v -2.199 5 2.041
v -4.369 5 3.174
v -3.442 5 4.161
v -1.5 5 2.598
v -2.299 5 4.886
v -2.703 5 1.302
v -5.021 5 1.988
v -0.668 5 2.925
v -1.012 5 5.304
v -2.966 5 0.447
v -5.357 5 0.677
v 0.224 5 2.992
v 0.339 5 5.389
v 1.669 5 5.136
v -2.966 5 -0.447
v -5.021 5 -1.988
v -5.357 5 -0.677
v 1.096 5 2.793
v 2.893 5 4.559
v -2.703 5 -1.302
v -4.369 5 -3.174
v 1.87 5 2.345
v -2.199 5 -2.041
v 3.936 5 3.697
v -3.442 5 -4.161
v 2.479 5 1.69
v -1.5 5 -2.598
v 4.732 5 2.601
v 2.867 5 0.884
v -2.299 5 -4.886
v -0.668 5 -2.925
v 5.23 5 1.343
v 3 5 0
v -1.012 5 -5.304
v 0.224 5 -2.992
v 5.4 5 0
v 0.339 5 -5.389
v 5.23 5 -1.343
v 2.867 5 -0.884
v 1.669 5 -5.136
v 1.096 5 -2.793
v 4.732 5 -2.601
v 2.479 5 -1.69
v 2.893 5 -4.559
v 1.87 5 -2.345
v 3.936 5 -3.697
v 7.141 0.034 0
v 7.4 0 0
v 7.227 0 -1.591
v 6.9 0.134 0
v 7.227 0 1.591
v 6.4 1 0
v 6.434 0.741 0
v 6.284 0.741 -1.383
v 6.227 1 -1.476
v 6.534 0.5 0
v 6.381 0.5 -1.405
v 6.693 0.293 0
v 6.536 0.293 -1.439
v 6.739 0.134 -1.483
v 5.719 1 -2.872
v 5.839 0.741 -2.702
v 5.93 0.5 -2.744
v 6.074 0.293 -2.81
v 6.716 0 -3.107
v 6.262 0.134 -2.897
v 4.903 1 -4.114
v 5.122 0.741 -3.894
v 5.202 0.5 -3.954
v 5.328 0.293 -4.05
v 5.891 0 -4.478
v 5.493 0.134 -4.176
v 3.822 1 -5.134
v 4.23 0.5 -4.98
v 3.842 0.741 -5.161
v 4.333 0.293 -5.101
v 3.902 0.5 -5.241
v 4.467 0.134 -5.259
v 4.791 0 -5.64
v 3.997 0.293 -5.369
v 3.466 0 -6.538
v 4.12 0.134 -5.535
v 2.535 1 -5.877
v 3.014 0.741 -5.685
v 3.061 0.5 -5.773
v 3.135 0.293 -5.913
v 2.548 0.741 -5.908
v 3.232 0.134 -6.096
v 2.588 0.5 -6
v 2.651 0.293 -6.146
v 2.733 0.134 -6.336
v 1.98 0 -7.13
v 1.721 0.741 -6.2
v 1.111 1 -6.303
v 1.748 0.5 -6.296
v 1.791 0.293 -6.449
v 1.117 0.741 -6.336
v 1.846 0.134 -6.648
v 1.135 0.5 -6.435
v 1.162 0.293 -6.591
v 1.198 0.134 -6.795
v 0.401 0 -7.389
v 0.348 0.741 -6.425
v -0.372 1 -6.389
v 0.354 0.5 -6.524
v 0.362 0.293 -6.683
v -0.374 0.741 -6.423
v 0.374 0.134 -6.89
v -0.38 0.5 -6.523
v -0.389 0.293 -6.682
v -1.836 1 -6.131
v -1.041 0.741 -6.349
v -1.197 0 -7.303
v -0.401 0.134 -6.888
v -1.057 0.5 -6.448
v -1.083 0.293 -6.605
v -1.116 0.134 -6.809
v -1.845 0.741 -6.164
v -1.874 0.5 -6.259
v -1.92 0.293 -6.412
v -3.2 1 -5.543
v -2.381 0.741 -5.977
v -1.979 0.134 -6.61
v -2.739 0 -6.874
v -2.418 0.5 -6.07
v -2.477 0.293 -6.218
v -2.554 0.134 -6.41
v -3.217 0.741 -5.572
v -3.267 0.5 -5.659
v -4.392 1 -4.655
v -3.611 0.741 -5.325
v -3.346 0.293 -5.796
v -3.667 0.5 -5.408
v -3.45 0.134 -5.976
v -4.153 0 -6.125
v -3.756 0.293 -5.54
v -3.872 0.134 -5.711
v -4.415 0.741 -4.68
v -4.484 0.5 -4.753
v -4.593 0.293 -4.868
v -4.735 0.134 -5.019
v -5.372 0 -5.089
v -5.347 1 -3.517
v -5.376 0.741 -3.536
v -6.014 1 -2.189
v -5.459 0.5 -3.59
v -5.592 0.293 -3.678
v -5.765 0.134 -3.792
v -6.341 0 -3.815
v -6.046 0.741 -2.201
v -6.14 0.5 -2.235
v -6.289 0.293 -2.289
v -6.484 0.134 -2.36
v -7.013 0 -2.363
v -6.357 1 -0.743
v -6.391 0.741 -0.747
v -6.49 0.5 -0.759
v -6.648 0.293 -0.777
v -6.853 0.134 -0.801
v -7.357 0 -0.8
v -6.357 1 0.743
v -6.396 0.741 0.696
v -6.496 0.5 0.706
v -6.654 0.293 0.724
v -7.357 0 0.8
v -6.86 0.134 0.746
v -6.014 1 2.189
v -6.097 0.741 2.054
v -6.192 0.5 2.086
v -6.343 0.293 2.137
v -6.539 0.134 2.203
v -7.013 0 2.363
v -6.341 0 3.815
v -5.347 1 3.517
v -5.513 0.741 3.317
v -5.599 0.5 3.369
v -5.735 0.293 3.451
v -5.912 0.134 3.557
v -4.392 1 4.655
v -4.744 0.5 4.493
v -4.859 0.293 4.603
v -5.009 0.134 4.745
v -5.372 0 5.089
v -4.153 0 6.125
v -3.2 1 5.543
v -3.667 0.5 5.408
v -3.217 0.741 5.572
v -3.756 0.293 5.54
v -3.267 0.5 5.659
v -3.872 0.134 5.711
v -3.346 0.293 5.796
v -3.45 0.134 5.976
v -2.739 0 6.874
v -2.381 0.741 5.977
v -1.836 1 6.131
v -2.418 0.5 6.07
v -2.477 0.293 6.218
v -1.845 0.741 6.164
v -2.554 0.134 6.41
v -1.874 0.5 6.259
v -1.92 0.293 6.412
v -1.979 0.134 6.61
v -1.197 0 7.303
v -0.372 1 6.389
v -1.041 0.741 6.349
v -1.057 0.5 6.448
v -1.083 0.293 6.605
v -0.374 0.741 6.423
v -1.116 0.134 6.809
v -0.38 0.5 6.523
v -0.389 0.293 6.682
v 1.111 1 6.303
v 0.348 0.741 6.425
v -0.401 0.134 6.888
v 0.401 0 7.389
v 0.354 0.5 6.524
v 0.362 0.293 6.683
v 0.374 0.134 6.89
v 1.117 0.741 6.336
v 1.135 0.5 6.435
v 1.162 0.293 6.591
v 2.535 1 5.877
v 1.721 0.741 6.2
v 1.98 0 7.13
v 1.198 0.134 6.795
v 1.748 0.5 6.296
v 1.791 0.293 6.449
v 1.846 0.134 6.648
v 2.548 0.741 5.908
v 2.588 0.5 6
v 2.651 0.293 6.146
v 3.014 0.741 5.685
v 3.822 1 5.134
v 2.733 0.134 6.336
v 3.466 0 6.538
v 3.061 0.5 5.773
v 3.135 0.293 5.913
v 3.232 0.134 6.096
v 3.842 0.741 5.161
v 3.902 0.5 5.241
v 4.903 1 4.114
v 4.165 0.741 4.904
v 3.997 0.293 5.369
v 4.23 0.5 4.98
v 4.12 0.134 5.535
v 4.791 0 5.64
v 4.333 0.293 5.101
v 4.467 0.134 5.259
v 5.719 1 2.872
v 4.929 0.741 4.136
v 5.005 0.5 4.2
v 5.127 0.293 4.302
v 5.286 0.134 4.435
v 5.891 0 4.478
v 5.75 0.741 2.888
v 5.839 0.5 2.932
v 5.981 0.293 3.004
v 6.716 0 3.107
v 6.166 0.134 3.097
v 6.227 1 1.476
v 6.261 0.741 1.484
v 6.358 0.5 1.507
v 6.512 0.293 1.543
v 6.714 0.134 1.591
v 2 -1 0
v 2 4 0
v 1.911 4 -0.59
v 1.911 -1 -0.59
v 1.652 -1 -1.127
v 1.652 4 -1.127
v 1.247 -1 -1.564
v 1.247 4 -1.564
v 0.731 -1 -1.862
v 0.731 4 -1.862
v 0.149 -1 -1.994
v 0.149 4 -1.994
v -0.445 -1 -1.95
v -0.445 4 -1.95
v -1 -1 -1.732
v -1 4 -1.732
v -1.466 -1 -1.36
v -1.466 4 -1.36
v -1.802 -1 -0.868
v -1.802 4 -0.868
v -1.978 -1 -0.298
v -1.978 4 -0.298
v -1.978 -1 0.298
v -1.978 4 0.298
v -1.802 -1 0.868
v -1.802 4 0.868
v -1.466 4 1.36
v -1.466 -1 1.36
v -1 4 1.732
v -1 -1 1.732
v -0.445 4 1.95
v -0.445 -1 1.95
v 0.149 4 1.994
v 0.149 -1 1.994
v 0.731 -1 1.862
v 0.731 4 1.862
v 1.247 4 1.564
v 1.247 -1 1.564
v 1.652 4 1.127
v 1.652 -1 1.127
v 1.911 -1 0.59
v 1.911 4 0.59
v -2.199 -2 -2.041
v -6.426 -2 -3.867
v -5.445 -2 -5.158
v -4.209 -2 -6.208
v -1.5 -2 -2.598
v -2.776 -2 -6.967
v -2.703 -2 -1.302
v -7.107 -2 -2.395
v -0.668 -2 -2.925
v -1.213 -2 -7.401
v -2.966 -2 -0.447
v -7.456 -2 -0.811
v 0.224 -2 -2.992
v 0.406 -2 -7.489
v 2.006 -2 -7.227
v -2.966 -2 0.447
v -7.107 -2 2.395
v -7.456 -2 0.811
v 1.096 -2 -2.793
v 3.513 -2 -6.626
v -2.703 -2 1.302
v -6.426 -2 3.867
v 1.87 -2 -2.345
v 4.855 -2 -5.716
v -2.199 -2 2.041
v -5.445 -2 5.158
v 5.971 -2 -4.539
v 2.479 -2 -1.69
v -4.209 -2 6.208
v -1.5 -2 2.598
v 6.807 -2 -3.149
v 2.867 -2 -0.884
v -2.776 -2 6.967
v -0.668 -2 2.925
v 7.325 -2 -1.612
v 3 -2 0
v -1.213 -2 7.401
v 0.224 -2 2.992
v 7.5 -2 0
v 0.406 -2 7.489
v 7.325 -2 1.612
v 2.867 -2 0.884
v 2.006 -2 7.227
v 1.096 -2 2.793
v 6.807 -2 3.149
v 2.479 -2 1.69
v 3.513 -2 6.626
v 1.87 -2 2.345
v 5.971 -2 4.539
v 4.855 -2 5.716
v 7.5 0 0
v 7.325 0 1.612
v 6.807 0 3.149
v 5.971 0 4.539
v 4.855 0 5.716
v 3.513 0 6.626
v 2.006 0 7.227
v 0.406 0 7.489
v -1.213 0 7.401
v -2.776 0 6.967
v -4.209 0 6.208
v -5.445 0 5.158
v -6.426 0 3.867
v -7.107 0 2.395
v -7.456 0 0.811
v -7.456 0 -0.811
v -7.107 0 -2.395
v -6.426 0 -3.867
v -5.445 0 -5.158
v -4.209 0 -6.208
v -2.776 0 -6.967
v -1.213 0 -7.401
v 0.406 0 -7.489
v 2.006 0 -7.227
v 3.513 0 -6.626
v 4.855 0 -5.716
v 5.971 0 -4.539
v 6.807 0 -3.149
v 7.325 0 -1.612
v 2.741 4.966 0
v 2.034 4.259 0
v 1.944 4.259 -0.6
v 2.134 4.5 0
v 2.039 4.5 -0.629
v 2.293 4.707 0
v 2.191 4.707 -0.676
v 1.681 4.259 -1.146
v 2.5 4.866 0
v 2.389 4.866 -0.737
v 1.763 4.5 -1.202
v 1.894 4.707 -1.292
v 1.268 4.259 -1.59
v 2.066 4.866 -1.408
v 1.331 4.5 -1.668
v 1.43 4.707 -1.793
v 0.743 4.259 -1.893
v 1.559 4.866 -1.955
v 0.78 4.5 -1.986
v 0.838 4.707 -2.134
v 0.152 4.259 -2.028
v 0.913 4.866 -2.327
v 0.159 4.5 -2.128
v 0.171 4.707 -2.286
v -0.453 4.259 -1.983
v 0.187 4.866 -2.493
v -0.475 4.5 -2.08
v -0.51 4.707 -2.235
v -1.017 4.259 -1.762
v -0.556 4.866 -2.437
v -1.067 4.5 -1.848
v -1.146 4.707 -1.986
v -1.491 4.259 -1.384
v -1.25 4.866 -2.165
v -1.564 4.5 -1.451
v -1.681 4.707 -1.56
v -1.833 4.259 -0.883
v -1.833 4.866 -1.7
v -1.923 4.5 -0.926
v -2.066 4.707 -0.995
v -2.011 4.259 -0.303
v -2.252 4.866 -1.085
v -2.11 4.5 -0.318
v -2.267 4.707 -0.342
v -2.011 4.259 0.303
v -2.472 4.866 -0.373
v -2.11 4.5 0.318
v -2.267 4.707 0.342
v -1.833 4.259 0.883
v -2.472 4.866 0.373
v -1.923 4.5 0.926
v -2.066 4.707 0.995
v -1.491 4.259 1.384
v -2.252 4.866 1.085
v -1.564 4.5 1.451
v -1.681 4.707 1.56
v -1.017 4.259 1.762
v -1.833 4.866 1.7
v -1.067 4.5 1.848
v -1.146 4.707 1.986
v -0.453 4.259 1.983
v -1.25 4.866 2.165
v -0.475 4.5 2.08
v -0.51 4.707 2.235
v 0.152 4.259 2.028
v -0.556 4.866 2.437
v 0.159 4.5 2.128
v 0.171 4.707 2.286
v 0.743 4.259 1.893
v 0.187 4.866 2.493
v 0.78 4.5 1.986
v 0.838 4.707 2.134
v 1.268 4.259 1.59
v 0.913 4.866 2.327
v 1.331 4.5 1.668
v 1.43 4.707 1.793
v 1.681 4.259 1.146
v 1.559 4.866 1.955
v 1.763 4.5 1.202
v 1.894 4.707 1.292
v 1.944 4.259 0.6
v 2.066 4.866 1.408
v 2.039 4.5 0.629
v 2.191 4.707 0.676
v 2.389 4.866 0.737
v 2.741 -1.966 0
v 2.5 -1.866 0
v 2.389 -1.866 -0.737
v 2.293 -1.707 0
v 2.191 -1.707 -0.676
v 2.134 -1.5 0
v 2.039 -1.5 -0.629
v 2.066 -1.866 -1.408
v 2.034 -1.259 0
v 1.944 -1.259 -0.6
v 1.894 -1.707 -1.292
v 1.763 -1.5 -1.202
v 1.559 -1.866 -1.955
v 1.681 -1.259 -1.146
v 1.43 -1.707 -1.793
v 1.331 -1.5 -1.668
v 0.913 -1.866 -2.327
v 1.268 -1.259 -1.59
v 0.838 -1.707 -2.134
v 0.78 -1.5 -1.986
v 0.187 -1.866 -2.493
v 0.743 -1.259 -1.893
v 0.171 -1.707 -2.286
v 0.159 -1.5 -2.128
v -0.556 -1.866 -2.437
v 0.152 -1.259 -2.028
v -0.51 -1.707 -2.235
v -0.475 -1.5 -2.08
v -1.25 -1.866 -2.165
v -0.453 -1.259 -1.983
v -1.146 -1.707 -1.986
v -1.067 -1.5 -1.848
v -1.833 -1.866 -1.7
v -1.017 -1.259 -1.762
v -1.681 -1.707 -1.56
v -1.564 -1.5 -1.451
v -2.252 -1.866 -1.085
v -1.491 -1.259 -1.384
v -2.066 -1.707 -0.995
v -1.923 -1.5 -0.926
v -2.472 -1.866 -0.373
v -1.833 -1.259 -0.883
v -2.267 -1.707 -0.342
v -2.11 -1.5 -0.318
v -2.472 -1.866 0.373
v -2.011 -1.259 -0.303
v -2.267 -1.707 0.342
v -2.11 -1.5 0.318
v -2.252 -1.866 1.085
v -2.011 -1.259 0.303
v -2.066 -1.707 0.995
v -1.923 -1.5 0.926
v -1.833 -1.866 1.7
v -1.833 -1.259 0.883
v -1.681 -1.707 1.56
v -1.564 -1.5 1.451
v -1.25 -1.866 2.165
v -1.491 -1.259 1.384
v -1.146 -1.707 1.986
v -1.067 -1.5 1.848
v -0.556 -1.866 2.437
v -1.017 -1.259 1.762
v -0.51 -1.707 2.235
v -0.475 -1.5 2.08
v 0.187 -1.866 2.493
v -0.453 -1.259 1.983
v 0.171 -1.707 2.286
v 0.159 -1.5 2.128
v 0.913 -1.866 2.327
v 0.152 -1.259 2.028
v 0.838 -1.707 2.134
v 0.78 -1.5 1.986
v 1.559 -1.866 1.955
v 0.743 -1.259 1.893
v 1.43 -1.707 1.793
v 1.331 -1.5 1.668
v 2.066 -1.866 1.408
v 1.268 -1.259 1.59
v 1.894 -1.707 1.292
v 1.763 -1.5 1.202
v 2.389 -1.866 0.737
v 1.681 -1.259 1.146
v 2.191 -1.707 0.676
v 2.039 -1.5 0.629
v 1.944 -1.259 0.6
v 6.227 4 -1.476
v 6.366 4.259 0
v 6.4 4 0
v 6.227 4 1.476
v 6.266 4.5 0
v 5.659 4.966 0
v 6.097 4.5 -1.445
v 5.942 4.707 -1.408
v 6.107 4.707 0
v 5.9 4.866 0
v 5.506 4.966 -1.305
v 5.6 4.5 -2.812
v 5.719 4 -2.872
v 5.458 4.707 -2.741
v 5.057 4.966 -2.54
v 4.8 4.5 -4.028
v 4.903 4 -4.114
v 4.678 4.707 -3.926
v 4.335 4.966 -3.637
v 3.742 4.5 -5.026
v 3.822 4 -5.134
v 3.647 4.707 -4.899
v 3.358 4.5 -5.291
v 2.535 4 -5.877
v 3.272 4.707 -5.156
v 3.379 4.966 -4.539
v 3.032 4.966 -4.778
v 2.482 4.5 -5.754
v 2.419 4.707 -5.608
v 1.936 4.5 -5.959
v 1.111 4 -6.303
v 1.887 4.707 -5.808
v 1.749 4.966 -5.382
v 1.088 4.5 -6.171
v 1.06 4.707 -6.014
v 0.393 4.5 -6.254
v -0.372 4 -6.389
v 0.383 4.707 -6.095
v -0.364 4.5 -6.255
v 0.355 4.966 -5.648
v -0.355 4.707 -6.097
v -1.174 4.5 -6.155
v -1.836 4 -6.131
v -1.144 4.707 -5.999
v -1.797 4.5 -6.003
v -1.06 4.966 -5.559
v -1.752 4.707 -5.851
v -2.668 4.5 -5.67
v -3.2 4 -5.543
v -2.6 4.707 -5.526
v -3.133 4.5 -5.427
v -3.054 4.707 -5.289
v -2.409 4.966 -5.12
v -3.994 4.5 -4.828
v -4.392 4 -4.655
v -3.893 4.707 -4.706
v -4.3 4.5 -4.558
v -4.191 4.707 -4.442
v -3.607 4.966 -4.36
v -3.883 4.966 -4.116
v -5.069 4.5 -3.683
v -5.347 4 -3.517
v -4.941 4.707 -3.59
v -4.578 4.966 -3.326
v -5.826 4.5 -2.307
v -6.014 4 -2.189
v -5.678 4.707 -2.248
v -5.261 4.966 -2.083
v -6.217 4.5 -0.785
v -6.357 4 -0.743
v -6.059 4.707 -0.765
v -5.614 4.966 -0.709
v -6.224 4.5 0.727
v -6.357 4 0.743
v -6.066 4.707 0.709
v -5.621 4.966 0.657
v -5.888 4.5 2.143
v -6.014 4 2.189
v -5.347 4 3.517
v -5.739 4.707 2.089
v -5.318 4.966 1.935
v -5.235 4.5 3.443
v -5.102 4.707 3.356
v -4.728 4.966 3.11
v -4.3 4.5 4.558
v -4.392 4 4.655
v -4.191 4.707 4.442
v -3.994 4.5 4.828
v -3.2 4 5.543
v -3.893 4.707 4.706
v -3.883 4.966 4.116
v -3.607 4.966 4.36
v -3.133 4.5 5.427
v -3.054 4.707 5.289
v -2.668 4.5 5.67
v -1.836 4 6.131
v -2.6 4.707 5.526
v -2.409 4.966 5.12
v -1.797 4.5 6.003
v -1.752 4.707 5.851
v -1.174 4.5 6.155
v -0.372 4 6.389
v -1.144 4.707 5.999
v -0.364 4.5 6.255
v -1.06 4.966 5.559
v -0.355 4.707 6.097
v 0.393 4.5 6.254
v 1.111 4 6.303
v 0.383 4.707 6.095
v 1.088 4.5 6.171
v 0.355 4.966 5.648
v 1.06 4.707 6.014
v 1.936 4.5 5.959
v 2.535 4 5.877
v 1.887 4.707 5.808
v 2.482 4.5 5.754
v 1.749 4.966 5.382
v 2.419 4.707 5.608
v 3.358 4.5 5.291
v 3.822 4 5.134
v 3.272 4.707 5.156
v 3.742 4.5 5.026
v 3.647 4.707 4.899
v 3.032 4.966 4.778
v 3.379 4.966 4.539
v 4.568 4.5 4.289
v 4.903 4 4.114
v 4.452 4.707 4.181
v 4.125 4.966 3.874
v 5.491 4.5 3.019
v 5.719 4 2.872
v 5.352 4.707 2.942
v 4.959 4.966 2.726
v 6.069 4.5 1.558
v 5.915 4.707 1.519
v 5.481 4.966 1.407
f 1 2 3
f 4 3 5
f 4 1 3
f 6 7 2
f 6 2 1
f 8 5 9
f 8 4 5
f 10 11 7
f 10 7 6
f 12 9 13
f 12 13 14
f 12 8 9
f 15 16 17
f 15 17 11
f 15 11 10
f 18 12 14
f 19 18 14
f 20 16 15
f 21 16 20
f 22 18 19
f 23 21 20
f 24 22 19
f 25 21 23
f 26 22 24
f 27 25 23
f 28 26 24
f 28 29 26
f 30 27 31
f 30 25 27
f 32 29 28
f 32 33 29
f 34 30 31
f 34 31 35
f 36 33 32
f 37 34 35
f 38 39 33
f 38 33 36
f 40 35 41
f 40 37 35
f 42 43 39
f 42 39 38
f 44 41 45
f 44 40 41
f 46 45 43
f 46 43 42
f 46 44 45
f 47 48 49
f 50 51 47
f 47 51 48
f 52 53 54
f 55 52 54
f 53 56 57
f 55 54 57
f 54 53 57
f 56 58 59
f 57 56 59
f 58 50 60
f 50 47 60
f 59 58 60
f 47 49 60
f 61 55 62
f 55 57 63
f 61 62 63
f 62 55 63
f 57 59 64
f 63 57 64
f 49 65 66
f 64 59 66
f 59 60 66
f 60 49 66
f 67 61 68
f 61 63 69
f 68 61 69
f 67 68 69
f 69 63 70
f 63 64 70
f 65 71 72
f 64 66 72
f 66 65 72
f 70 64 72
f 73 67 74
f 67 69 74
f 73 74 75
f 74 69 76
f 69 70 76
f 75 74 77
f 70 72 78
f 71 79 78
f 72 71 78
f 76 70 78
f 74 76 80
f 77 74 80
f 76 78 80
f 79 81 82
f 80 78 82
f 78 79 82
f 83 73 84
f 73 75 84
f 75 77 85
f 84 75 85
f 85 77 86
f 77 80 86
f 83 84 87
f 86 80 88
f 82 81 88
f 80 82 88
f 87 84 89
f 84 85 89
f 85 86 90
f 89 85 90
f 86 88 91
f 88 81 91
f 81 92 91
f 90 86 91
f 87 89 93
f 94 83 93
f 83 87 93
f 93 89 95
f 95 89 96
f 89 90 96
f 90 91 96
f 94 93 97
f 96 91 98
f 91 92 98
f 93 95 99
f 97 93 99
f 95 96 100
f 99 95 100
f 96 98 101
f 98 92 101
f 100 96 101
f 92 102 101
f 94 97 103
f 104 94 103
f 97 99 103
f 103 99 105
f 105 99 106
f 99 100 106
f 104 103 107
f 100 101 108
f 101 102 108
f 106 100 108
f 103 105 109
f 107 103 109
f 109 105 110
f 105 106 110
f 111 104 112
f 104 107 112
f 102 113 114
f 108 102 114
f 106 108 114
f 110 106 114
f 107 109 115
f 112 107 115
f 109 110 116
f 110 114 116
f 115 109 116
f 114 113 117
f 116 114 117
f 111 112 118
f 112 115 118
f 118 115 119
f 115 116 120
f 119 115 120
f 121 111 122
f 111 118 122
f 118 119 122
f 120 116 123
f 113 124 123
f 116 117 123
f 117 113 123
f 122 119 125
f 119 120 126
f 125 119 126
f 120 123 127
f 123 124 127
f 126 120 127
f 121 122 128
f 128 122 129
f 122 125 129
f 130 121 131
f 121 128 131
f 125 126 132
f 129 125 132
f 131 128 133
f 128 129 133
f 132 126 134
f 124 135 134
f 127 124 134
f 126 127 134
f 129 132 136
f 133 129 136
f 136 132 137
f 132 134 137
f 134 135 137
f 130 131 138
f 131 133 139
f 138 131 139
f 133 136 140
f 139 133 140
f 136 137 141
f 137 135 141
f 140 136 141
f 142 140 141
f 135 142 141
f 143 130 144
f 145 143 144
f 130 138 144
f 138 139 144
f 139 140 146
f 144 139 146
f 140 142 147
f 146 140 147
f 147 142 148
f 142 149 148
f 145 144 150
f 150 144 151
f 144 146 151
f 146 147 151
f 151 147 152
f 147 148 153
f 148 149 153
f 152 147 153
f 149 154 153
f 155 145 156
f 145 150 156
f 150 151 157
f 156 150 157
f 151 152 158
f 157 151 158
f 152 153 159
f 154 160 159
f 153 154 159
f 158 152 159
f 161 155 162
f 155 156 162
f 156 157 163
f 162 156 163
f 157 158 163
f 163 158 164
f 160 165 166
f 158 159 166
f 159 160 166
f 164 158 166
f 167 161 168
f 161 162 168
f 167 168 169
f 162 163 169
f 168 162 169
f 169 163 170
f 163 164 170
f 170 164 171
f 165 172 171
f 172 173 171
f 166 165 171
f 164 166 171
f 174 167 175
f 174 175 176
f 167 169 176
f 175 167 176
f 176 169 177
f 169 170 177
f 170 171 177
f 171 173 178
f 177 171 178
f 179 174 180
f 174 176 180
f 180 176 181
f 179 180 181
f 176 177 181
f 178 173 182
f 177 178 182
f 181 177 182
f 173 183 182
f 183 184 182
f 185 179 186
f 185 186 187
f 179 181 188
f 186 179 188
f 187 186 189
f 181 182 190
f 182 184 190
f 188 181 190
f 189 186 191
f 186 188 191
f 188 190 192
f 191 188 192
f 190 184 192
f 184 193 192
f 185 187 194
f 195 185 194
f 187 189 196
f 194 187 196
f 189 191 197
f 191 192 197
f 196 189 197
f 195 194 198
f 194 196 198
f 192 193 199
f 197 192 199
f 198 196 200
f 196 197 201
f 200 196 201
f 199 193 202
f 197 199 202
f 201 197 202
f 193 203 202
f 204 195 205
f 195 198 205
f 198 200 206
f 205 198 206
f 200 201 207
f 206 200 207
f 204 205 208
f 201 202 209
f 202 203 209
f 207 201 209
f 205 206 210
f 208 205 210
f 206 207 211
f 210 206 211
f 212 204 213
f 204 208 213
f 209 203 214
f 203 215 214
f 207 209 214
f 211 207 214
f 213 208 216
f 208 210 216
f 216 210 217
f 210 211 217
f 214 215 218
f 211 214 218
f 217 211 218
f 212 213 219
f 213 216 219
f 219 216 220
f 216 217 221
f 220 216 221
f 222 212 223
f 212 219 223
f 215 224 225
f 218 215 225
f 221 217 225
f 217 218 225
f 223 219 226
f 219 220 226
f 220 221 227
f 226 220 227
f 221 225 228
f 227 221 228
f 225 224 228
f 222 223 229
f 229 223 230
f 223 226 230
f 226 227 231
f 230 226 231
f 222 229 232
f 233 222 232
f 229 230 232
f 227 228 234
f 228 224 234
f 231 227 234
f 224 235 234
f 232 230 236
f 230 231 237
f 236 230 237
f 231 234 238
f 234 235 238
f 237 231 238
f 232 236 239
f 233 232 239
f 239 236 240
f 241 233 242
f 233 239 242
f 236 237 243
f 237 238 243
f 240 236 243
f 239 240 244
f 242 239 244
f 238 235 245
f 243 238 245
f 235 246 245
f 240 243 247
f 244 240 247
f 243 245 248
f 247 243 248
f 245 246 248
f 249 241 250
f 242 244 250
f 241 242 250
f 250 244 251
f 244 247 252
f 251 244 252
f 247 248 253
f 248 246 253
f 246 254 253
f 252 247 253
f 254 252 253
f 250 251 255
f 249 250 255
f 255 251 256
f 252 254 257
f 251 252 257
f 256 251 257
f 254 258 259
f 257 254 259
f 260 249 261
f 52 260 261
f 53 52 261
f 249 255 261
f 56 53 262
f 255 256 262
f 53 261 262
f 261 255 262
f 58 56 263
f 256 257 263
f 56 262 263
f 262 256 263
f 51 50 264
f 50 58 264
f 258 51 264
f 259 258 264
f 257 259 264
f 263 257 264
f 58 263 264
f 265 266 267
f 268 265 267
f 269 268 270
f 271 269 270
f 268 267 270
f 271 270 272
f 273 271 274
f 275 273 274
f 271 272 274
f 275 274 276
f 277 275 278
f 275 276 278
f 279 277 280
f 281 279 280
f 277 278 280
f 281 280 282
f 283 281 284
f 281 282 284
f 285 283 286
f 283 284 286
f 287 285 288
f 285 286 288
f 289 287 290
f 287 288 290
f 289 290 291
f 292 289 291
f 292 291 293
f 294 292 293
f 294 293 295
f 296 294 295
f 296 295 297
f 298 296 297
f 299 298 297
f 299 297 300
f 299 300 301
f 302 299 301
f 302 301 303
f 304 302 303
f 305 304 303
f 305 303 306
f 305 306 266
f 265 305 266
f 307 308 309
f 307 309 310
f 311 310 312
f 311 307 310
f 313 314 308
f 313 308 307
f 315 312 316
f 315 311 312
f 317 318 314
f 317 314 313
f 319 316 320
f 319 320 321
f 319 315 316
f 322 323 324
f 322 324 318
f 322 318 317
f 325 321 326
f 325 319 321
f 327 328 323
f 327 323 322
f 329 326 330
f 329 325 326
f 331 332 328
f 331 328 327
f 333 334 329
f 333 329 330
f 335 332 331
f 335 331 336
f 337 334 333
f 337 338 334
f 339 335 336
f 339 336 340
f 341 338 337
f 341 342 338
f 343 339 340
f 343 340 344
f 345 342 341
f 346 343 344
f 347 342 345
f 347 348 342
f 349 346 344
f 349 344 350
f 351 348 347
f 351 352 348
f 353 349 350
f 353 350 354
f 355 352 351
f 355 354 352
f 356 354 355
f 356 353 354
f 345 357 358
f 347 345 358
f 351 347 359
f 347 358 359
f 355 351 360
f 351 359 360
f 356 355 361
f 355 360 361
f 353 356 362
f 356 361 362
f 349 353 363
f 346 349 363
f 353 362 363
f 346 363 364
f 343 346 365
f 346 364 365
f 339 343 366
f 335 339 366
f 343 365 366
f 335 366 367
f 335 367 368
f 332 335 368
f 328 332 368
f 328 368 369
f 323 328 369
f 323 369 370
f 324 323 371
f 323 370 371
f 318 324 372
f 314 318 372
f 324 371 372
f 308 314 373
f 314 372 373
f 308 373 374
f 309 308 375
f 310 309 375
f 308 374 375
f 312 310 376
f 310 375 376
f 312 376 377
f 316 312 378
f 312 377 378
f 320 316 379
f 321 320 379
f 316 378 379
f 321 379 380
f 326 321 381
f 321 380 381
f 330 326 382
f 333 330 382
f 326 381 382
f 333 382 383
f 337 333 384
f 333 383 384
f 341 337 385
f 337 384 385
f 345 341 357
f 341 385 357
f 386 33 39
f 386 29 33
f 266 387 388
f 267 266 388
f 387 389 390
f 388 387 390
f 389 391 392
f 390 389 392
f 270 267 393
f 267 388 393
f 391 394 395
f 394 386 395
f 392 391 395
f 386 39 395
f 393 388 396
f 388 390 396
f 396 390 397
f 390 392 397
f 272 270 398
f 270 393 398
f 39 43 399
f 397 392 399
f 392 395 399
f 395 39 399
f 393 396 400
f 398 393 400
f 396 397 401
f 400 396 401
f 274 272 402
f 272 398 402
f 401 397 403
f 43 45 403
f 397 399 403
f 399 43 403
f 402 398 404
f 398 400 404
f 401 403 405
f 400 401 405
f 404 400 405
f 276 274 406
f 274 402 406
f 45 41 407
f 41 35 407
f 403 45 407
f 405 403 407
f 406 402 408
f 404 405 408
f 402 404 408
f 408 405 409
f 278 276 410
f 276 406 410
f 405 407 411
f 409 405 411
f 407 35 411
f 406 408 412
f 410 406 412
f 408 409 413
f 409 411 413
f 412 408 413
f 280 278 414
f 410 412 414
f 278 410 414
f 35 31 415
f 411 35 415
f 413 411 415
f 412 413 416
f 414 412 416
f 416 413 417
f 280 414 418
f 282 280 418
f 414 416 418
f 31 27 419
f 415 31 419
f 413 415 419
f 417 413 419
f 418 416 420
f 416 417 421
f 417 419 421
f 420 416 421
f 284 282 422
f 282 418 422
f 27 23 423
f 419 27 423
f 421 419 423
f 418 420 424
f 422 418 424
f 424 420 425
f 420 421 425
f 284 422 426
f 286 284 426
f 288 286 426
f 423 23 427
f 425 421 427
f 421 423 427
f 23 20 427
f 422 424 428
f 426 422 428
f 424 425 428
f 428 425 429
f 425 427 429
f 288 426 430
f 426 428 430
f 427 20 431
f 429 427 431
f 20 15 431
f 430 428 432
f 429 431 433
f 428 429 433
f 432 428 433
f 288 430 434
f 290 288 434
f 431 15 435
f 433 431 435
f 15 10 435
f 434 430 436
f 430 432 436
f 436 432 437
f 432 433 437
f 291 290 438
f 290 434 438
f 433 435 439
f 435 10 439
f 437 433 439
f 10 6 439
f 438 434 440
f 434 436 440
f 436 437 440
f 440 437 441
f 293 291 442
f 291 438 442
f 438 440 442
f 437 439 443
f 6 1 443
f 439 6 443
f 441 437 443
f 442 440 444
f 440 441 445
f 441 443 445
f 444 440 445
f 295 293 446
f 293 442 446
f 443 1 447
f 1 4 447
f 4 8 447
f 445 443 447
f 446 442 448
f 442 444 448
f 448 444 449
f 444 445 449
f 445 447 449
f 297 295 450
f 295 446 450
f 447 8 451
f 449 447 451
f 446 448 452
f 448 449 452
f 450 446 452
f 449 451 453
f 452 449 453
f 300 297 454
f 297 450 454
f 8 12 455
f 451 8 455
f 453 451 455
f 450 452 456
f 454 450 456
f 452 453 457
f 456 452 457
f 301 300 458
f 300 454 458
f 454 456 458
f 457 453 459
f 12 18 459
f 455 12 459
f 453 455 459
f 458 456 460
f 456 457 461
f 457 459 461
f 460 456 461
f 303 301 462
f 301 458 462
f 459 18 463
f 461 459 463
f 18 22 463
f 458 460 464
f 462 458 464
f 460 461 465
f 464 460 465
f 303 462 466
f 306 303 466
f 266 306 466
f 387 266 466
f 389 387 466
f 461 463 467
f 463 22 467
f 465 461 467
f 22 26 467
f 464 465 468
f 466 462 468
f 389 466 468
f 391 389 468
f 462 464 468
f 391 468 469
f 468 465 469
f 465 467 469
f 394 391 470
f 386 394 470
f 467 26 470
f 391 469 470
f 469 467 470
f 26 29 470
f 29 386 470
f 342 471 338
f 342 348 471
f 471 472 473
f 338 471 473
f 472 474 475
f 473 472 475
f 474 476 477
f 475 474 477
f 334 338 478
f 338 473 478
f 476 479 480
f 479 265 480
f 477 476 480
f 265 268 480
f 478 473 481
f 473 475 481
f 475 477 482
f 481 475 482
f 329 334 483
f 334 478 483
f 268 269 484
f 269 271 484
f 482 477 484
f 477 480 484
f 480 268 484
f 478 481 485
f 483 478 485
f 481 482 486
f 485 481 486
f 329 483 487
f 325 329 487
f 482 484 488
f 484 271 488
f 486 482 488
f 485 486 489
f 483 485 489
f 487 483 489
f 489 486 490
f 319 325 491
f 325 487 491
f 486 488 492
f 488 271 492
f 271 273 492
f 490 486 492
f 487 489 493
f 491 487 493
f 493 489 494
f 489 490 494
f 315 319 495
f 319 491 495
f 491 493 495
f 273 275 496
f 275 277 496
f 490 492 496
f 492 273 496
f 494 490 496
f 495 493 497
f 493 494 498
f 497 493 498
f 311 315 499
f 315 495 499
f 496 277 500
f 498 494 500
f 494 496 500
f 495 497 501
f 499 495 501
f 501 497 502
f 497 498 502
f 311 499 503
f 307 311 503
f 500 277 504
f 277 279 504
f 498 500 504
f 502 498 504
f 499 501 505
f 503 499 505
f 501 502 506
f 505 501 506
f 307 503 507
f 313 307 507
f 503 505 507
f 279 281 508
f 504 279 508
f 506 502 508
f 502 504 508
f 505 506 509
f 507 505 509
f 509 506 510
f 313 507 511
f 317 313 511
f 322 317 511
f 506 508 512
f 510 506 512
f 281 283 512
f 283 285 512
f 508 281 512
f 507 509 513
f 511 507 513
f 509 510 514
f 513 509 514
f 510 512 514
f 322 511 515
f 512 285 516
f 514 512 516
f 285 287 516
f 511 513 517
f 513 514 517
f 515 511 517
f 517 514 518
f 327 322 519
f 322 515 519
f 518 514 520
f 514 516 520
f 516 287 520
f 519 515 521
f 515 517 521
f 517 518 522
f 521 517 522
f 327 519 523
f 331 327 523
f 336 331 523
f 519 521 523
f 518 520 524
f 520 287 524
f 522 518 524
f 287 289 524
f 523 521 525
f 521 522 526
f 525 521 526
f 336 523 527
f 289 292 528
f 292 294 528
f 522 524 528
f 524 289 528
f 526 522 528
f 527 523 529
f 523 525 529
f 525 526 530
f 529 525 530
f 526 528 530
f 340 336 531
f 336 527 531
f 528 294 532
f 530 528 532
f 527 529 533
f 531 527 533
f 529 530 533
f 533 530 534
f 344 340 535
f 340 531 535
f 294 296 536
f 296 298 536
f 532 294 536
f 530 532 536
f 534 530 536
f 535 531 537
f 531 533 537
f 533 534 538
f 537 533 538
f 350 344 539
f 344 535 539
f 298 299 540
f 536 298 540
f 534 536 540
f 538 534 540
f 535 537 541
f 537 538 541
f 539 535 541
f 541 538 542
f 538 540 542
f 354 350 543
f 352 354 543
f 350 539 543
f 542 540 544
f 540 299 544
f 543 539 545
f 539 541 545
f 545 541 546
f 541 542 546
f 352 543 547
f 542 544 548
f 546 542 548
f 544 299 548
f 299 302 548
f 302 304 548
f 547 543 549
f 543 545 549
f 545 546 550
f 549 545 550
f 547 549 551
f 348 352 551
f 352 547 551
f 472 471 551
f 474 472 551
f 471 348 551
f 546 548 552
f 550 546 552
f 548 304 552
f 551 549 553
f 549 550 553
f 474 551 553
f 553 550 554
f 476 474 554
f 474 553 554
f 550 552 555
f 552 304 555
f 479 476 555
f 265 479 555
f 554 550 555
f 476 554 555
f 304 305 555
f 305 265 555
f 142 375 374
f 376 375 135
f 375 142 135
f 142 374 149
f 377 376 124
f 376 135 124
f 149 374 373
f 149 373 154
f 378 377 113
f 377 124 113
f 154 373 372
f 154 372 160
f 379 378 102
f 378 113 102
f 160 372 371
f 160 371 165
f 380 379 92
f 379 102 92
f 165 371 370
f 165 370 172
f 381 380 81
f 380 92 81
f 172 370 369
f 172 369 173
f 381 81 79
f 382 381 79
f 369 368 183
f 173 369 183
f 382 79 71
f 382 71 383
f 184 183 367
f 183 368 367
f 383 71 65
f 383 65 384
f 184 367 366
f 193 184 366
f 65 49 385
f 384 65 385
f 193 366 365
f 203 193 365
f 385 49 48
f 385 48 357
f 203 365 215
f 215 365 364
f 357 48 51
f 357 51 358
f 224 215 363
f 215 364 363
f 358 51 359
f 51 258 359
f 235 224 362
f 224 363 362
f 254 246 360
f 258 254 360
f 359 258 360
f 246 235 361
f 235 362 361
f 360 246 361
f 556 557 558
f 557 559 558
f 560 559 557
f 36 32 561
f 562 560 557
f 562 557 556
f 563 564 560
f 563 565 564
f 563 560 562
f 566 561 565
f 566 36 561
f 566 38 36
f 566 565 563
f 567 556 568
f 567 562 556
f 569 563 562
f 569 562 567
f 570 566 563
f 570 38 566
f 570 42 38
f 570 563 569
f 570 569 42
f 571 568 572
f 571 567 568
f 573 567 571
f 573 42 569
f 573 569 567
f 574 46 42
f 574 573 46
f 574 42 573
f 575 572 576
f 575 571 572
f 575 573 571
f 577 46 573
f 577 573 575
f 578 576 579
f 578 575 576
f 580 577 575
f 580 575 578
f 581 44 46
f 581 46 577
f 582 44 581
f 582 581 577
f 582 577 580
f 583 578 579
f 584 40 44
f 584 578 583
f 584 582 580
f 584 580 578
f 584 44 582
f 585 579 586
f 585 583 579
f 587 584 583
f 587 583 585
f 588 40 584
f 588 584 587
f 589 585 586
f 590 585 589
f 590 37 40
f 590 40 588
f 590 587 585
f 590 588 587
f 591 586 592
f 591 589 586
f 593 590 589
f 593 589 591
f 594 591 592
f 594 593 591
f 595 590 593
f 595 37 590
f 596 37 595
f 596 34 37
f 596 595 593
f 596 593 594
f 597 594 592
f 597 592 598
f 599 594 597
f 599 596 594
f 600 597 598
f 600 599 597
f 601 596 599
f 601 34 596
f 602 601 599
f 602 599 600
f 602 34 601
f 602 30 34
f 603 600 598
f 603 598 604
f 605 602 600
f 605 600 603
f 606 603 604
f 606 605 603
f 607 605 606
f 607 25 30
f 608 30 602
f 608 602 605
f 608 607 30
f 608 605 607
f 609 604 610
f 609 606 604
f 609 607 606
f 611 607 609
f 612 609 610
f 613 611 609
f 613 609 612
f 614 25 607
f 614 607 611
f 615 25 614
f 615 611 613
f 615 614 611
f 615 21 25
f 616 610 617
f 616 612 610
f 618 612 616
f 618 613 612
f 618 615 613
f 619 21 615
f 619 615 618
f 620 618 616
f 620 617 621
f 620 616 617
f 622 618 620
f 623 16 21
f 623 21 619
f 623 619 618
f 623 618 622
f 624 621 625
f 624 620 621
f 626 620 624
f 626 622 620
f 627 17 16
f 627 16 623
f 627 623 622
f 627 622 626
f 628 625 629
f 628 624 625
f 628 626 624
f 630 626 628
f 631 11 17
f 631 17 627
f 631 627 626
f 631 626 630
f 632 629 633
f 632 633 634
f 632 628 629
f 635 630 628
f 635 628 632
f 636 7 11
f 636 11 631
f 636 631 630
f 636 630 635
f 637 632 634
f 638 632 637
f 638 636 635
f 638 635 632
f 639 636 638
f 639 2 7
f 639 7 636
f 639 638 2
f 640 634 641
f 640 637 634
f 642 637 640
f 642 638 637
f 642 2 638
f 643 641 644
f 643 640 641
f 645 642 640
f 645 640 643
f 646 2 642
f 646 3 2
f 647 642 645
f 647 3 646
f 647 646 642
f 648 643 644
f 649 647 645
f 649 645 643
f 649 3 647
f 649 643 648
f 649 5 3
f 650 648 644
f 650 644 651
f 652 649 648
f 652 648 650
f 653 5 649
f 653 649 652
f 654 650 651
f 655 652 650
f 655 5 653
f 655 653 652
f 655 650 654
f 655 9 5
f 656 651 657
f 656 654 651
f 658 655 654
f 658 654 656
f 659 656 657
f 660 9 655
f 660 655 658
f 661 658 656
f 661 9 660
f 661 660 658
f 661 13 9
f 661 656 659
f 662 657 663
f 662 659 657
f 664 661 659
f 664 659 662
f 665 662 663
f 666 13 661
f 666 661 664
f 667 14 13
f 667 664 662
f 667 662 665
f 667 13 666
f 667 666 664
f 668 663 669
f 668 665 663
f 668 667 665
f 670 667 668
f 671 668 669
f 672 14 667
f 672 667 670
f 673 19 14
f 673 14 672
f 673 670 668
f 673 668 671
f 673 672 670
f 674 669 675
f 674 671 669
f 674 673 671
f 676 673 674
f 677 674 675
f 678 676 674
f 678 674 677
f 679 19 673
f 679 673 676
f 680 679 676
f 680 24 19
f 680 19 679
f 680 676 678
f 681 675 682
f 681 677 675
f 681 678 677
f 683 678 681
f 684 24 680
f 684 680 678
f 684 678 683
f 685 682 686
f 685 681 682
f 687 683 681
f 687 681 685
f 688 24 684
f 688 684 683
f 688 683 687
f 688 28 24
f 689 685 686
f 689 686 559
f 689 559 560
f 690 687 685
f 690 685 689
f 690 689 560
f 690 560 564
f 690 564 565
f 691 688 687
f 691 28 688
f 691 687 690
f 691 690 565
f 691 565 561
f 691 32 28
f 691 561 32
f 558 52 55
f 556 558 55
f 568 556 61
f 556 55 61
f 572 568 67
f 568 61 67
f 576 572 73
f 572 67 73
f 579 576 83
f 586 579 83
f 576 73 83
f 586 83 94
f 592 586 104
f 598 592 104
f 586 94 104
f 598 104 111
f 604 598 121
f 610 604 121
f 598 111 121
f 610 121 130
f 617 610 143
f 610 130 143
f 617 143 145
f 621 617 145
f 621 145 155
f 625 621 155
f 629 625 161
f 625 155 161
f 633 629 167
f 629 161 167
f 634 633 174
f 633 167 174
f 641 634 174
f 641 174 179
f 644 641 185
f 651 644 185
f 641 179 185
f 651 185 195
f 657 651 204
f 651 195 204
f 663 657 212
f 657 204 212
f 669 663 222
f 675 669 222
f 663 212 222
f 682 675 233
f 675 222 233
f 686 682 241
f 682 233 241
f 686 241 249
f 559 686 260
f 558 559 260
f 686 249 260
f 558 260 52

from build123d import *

# Parameters (mm, degrees)
SKETCH_1_R          = 6.4
EXTRUDE_1_DEPTH     = 5
SKETCH_3_R          = 7.5
EXTRUDE_2_DEPTH     = 2
SKETCH_2_R          = 2
CUT_EXTRUDE_1_DEPTH = 8
FILLET_1_R          = 1
FILLET_2_R          = 1
FILLET_3_R          = 1


with BuildPart() as part:
    # 草图1 → 凸台-拉伸1 (new body)
    with BuildSketch(Plane(origin=(0, 0, 0), x_dir=(1, 0, 0), z_dir=(0, 1, 0))):
        Circle(SKETCH_1_R)
    extrude(amount=EXTRUDE_1_DEPTH)

    # 草图3 → 凸台-拉伸2 (add)
    with BuildSketch(Plane.XZ):
        Circle(SKETCH_3_R)
    extrude(amount=EXTRUDE_2_DEPTH)

    # 草图2 → 切除-拉伸1 (cut, through all)
    with BuildSketch(Plane(origin=(0, 5, 0), x_dir=(1, 0, 0), z_dir=(0, 1, 0))):
        Circle(SKETCH_2_R)
    extrude(amount=-CUT_EXTRUDE_1_DEPTH, mode=Mode.SUBTRACT)

    # 圆角1
    fillet_1_edges = [part.edges().sort_by_distance(p)[0] for p in [
        (-2, 5, 0),
        (-6.4, 5, 0),
    ]]
    fillet(fillet_1_edges, radius=FILLET_1_R)

    # 圆角2
    fillet_2_edges = [part.edges().sort_by_distance(p)[0] for p in [
        (-6.4, 0, 0),
    ]]
    fillet(fillet_2_edges, radius=FILLET_2_R)

    # 圆角3
    fillet_3_edges = [part.edges().sort_by_distance(p)[0] for p in [
        (-2, -2, 0),
    ]]
    fillet(fillet_3_edges, radius=FILLET_3_R)


solid = part.part
